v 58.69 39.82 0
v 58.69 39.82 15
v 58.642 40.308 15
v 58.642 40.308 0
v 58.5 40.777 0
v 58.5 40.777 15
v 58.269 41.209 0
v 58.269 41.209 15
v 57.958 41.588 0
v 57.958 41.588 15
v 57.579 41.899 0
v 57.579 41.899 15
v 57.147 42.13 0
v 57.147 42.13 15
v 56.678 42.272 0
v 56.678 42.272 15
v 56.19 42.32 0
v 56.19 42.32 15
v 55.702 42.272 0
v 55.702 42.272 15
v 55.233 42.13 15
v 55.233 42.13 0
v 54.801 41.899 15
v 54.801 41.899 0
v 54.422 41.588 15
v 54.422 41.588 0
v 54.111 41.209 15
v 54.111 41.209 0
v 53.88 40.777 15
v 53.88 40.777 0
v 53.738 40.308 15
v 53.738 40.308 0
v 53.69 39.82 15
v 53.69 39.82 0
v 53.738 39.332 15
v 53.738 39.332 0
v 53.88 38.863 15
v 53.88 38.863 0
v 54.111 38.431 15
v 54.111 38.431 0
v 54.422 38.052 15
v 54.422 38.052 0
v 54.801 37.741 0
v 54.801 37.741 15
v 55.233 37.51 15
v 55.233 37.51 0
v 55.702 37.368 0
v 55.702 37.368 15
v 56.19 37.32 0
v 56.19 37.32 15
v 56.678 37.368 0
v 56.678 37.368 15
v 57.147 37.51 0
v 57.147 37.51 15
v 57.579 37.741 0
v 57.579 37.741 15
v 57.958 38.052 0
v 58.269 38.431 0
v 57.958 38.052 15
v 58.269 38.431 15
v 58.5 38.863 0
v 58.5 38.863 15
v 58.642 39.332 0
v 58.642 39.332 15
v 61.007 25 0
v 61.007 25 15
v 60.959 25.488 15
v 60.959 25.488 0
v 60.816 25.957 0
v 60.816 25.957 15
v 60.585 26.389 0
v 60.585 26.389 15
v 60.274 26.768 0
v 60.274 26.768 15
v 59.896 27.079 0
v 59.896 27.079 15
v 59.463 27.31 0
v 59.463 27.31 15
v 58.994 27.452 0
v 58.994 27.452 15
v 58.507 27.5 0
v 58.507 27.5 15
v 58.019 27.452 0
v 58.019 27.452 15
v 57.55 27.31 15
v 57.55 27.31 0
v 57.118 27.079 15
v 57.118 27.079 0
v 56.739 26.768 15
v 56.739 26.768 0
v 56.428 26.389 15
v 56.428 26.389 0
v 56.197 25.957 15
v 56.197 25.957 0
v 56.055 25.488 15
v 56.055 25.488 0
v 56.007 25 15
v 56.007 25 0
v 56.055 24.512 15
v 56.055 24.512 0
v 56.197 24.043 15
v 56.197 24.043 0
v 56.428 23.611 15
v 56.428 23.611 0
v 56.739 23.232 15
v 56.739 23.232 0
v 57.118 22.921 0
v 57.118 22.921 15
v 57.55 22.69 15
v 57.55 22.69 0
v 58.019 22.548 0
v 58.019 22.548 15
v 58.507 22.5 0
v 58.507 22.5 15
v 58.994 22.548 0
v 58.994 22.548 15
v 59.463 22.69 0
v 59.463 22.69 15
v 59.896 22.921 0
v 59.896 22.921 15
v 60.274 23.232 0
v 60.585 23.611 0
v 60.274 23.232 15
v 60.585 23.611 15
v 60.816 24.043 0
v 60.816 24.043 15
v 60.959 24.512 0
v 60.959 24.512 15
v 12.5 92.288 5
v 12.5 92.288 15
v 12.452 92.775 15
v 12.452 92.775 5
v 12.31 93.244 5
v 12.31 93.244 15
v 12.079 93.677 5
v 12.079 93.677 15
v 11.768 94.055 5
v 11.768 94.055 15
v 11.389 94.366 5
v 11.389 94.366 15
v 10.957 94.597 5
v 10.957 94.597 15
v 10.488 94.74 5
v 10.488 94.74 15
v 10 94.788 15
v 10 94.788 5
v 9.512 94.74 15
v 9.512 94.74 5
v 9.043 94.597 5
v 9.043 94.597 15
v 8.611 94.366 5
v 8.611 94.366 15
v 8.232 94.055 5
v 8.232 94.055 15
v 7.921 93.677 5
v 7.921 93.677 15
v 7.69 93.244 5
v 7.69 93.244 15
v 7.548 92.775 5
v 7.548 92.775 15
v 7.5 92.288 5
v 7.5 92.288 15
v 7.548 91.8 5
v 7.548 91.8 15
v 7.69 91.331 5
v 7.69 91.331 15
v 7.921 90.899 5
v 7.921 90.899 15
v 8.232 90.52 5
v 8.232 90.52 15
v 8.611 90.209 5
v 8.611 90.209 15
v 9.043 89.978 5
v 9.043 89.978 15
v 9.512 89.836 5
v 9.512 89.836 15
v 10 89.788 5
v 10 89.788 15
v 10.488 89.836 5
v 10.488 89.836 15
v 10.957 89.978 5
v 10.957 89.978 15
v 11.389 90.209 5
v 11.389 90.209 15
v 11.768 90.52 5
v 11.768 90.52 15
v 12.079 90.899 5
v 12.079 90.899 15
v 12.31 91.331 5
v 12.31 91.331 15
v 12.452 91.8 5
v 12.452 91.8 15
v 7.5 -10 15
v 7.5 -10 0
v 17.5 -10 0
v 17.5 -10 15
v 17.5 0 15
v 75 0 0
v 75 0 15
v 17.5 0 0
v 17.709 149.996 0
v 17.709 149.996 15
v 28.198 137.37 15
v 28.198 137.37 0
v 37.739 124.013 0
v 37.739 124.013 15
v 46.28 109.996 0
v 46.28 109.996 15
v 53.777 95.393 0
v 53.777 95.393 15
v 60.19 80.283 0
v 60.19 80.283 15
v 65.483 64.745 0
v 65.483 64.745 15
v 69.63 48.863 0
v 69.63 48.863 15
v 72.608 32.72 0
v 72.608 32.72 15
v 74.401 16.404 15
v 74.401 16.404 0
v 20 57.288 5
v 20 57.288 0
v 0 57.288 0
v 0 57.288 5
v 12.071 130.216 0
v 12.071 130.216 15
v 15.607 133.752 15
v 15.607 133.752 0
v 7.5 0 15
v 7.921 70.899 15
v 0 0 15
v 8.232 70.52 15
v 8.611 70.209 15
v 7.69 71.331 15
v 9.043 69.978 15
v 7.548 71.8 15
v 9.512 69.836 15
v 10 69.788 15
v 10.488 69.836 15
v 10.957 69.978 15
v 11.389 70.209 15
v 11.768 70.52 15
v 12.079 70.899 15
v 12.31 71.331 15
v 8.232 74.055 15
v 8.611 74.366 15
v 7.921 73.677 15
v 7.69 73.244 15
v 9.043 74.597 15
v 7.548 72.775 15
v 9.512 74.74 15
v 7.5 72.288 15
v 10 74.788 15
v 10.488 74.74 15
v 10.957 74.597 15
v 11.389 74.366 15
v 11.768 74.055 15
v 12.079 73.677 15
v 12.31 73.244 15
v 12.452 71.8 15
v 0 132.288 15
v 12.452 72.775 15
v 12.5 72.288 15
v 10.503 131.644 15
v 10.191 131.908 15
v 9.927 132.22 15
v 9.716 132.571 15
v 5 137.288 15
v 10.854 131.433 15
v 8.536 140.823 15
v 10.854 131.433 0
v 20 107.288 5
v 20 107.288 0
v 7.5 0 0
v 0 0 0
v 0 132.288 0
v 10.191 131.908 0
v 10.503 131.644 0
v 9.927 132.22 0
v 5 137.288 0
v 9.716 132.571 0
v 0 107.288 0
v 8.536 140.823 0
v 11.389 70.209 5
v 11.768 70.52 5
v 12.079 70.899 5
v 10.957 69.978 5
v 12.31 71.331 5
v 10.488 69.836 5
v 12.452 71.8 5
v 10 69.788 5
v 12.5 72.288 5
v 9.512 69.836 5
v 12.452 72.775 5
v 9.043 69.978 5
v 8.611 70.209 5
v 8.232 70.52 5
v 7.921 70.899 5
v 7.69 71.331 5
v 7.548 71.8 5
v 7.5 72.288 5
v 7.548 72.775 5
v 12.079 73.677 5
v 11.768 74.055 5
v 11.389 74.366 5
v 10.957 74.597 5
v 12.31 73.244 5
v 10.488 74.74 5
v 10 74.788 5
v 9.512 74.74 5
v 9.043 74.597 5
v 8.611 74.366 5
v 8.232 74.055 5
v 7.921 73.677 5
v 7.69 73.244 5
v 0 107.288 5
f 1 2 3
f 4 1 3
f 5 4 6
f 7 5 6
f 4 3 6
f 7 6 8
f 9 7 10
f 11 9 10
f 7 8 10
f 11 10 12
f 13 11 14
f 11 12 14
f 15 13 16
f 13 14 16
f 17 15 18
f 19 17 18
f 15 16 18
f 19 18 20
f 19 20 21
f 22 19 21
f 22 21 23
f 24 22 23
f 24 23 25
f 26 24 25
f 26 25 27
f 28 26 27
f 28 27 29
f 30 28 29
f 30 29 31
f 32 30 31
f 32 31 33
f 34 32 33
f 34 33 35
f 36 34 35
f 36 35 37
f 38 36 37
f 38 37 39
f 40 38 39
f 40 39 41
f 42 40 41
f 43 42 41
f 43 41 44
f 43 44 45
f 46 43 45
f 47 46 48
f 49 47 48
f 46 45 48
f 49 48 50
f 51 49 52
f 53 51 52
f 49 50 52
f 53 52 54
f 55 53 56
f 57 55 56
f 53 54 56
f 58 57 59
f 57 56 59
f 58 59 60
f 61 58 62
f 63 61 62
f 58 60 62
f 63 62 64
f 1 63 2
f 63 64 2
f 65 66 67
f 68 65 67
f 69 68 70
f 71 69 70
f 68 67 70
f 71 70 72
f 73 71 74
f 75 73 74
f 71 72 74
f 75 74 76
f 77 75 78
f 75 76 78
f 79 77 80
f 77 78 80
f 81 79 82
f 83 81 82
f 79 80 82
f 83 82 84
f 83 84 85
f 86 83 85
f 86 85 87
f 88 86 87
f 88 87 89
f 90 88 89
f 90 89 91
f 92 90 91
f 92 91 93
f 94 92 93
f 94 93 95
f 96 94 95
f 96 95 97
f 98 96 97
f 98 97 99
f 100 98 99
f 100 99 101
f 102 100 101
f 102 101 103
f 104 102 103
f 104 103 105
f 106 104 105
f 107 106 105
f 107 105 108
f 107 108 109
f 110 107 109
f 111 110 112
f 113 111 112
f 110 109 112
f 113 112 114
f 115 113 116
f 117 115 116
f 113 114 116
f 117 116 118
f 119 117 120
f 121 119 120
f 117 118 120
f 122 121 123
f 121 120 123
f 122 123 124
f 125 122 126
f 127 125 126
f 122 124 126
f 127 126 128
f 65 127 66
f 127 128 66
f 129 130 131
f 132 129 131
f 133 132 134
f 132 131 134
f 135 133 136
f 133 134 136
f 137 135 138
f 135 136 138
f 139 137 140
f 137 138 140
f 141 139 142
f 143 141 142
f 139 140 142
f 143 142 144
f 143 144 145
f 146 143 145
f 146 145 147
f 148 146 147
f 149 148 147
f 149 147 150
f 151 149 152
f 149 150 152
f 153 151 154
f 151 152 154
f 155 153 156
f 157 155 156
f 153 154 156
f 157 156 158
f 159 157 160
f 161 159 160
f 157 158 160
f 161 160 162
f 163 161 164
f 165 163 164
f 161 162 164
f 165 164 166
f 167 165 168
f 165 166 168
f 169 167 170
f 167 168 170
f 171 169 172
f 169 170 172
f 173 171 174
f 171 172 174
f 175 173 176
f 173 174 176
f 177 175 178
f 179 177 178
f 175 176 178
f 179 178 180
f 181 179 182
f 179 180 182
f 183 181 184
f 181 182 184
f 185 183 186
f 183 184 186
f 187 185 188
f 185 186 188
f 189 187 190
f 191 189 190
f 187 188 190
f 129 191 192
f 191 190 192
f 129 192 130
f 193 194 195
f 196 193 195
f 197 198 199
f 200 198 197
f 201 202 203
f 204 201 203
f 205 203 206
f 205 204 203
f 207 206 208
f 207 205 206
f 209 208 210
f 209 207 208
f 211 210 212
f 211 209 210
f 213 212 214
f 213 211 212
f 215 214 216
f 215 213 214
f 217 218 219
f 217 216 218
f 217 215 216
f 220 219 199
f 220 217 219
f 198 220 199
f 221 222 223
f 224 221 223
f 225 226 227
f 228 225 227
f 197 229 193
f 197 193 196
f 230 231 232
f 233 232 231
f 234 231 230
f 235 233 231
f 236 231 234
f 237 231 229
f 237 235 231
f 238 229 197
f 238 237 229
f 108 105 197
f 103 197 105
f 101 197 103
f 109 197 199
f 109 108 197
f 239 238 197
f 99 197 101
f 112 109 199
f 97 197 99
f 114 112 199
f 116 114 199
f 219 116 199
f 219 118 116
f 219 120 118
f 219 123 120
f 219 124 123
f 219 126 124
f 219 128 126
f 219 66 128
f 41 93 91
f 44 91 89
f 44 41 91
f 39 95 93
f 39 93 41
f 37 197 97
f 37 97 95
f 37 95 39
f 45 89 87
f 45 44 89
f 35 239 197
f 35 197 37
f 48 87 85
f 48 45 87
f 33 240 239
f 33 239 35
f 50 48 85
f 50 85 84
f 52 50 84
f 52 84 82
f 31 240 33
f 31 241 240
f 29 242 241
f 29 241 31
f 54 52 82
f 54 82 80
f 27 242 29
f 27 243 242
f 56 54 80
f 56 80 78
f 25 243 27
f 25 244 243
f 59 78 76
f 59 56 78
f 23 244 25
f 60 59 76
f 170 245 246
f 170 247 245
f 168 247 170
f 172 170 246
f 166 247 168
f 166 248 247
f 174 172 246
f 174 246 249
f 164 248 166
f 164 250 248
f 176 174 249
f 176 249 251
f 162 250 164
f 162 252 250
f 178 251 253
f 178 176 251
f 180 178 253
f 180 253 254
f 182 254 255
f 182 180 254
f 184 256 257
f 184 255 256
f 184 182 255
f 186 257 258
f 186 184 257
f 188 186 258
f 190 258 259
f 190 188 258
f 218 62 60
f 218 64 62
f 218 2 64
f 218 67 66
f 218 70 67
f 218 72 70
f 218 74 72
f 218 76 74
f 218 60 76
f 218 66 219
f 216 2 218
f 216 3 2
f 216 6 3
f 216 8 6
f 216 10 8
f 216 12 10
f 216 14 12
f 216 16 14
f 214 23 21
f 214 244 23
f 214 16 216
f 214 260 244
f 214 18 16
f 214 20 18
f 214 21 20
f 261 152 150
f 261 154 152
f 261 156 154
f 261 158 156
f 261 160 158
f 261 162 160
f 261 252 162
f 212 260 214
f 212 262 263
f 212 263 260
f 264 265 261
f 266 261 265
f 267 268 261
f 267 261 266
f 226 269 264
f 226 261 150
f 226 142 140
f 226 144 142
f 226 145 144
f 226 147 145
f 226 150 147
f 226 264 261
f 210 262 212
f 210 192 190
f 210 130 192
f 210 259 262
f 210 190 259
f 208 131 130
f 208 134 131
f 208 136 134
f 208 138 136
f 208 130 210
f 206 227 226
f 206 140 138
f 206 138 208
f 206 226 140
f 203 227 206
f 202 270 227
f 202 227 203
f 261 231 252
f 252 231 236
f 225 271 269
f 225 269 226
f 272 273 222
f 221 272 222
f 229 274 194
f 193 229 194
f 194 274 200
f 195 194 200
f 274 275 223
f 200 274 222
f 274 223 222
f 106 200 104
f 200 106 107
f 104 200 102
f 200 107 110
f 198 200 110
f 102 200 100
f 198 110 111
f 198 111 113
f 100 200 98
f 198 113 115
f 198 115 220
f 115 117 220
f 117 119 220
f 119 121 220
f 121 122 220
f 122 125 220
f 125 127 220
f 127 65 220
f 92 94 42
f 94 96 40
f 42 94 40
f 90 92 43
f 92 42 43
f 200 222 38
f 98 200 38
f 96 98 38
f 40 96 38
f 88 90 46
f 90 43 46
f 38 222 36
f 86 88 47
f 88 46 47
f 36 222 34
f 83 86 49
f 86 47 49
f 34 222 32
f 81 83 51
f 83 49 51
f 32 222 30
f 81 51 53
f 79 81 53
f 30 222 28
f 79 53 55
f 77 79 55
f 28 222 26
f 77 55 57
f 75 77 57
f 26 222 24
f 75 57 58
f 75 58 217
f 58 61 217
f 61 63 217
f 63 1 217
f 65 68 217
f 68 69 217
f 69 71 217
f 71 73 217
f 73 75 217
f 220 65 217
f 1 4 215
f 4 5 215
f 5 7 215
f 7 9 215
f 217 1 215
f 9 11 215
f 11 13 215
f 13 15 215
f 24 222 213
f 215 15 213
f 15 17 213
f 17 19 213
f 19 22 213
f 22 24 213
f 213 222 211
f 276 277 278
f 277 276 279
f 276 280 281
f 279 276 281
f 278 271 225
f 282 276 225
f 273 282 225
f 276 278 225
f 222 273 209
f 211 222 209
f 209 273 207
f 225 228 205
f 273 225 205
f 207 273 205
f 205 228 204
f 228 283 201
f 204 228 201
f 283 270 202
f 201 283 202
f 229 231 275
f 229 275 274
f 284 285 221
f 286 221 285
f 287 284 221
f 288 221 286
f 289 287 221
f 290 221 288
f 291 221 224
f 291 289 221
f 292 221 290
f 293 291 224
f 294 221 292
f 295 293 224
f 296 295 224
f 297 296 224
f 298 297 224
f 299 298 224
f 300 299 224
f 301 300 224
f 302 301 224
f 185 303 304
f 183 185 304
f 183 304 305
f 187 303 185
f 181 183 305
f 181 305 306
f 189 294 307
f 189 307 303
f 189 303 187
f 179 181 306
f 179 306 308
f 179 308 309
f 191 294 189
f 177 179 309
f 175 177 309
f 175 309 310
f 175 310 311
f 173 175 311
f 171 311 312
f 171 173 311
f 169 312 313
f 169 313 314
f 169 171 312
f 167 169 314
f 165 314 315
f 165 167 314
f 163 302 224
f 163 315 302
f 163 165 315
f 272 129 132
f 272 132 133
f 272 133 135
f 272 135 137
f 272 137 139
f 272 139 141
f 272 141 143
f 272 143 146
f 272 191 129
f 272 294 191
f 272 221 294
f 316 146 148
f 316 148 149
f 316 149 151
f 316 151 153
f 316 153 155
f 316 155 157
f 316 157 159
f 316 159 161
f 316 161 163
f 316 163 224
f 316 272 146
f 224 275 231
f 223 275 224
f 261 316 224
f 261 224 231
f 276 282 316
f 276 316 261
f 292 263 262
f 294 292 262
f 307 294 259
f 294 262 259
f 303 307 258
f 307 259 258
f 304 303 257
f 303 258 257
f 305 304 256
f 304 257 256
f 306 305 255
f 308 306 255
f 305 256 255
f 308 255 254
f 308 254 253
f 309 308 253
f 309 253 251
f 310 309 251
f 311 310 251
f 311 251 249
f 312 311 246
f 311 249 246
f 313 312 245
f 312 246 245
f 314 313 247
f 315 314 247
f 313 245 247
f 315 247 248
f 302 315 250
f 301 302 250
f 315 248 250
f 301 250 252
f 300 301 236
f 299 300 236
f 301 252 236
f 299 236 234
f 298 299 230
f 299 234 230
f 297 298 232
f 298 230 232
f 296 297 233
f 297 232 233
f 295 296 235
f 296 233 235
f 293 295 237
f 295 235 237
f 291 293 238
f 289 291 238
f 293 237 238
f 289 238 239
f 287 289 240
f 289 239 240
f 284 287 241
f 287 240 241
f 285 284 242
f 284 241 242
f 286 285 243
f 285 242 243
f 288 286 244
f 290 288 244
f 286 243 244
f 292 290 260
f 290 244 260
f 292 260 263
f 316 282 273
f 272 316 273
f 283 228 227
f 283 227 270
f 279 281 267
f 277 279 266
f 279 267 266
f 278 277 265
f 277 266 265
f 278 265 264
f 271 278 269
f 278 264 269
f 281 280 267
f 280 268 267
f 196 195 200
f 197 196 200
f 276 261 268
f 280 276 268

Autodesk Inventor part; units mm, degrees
ref_plane "YZ Plane" through (0, 0, 0) normal (1, 0, 0) x (0, 1, 0)
ref_plane "XZ Plane" through (0, 0, 0) normal (0, 1, 0) x (-1, 0, 0)
ref_plane "XY Plane" through (0, 0, 0) normal (0, 0, 1) x (1, 0, 0)
sketch "Sketch1" plane through (0, 0, 0) normal (0, 0, 1) x (1, 0, 0)
  circle A0 centre (-150, 0) radius 225 construction
  line L0 (0, 0) -> (0, 132.2876)
  line L1 (0, 132.2876) -> (17.7086, 149.9961)
  line L2 (0, 132.2876) -> (25.0437, 132.2876) construction
  arc A1 (75, 0) -> (17.7086, 149.9961) centre (-150, 0) ccw
  line L3 (75, 0) -> (25, 0)
  line L4 (25, 0) -> (17.5, 0)
  line L5 (0, 0) -> (7.5, 0)
  line L6 (7.5, 0) -> (7.5, -10)
  line L7 (7.5, -10) -> (17.5, -10)
  line L8 (17.5, -10) -> (17.5, 0)
  circle A2 centre (-150, 0) radius 200 construction
  dimension "d0" = 75
  dimension "d1" = 450
  dimension "d3" = 45
  dimension "d37" = 50
  dimension "d38" = 7.5
  dimension "d39" = 7.5
  dimension "d40" = 10
  dimension "d41" = 25
extrude "Extrusion1" add sketch "Sketch1" along normal blind 15
sketch "Sketch2" plane through (0, 0, 15) normal (0, 0, 1) x (1, 0, 0)
  circle A0 centre (58.5066, 25) radius 2.5
  circle A1 centre (56.1901, 39.8201) radius 2.5
  line L0 (0, 132.2876) -> (0, 0) projected
  line L1 (0, 0) -> (7.5, 0) projected
  line L2 (7.5, 0) -> (7.5, -10) projected
  line L3 (7.5, -10) -> (17.5, -10) projected
  line L4 (17.5, -10) -> (17.5, 0) projected
  line L5 (17.5, 0) -> (75, 0) projected
  arc A2 (75, 0) -> (17.7086, 149.9961) centre (-150, 0) ccw projected
  line L6 (17.7086, 149.9961) -> (0, 132.2876) projected
  arc A3 (59.4636, 15) -> (16.6742, 127.7486) centre (-150, 0) ccw construction
  line L7 (59.4636, 15) -> (17.5, 15) construction
  line L8 (17.5, 15) -> (15, 15) construction
  line L9 (15, 15) -> (15, 126.0744) construction
  line L10 (15, 126.0744) -> (16.6742, 127.7486) construction
  circle A4 centre (11.959, 133.676) radius 2.5
  circle A5 centre (-150, 0) radius 225 construction
  circle A6 centre (-150, 0) radius 210 construction
  dimension "d6" = 5
  dimension "d7" = 5
  dimension "d8" = 15
  dimension "d10" = 25
  dimension "d42" = 15
  dimension "d43" = 5
  dimension "d45" = 450
  dimension "d46" = 15
  dimension "d49" = 7.4745
extrude "Extrusion2" cut sketch "Sketch2" against normal through all contours A0 | A1 | A4
sketch "Sketch5" plane through (0, 0, 15) normal (0, 0, 1) x (1, 0, 0)
  line L0 (5, 137.2876) -> (12.0711, 130.2165)
  line L1 (5, 137.2876) -> (15, 137.2876) construction
  line L2 (12.0711, 130.2165) -> (15.6066, 133.752)
  line L3 (15.6066, 133.752) -> (8.5355, 140.8231)
  line L4 (8.5355, 140.8231) -> (5, 137.2876)
  line L5 (17.7086, 149.9961) -> (0, 132.2876) projected
  point P0 (0, 0)
  dimension "d29" = 10
  dimension "d30" = 45
  dimension "d31" = 5
  dimension "d32" = 10
  dimension "d33" = 90
  dimension "d34" = 5
extrude "Extrusion3" cut sketch "Sketch5" against normal through all
thread "Thread1" size "M5x0.8" class "6H" standard "ANSI Metric M Profile" full length
thread "Thread2" size "M5x0.8" class "6H" standard "ANSI Metric M Profile" full length
thread "Thread3" size "M5x0.8" class "6H" standard "ANSI Metric M Profile" full length
sketch "Sketch6" plane through (0, 0, 15) normal (0, 0, 1) x (1, 0, 0)
  line L0 (0, 107.2876) -> (20, 107.2876) construction
  line L1 (20, 107.2876) -> (20, 57.2876) construction
  line L2 (20, 57.2876) -> (0, 57.2876) construction
  line L3 (0, 57.2876) -> (0, 107.2876) construction
  line L4 (8.5355, 140.8231) -> (15.6066, 133.752) construction
  line L5 (15.6066, 133.752) -> (12.0711, 130.2165) construction
  line L6 (9.7164, 132.5711) -> (5, 137.2876) construction
  line L7 (5, 137.2876) -> (0, 132.2876) construction
  line L8 (0, 132.2876) -> (0, 0) construction
  line L9 (0, 0) -> (7.5, 0) construction
  line L10 (7.5, 0) -> (7.5, -10) construction
  line L11 (7.5, -10) -> (17.5, -10) construction
  line L12 (17.5, -10) -> (17.5, 0) construction
  line L13 (17.5, 0) -> (75, 0) construction
  arc A0 (75, 0) -> (17.7086, 149.9961) centre (-150, 0) ccw construction
  line L14 (17.7086, 149.9961) -> (8.5355, 140.8231) construction
  arc A1 (9.7164, 132.5711) -> (10.8542, 131.4334) centre (11.959, 133.676) ccw construction
  circle A2 centre (58.5066, 25) radius 2.5 construction
  circle A3 centre (56.1901, 39.8201) radius 2.5 construction
  circle A4 centre (10, 92.2876) radius 2.5
  circle A5 centre (10, 72.2876) radius 2.5
  line L15 (0, 132.2876) -> (0, 0) projected
  line L16 (12.0711, 130.2165) -> (10.8542, 131.4334) projected
  dimension "d50" = 20
  dimension "d51" = 50
  dimension "d52" = 25
  dimension "d53" = 5
  dimension "d54" = 5
  dimension "d55" = 20
  dimension "d56" = 15
  dimension "d57" = 10
extrude "Extrusion4" cut sketch "Sketch6" against normal through all
thread "Thread4" size "M5x0.8" class "6H" standard "ANSI Metric M Profile" full length
thread "Thread5" size "M5x0.8" class "6H" standard "ANSI Metric M Profile" full length
sketch "Sketch8" plane through (0, 0, 0) normal (0, 0, -1) x (-1, 0, 0)
  line L0 (0, 132.2876) -> (0, 0) projected
  line L1 (0, 107.2876) -> (-20, 107.2876)
  line L2 (-20, 107.2876) -> (-20, 57.2876)
  line L3 (-20, 57.2876) -> (0, 57.2876)
  line L4 (0, 57.2876) -> (0, 107.2876)
  dimension "d69" = 20
  dimension "d70" = 50
  dimension "d71" = 25
extrude "Extrusion6" cut sketch "Sketch8" against normal blind 5
properties part number "CP001" material "ABS Plastic"
